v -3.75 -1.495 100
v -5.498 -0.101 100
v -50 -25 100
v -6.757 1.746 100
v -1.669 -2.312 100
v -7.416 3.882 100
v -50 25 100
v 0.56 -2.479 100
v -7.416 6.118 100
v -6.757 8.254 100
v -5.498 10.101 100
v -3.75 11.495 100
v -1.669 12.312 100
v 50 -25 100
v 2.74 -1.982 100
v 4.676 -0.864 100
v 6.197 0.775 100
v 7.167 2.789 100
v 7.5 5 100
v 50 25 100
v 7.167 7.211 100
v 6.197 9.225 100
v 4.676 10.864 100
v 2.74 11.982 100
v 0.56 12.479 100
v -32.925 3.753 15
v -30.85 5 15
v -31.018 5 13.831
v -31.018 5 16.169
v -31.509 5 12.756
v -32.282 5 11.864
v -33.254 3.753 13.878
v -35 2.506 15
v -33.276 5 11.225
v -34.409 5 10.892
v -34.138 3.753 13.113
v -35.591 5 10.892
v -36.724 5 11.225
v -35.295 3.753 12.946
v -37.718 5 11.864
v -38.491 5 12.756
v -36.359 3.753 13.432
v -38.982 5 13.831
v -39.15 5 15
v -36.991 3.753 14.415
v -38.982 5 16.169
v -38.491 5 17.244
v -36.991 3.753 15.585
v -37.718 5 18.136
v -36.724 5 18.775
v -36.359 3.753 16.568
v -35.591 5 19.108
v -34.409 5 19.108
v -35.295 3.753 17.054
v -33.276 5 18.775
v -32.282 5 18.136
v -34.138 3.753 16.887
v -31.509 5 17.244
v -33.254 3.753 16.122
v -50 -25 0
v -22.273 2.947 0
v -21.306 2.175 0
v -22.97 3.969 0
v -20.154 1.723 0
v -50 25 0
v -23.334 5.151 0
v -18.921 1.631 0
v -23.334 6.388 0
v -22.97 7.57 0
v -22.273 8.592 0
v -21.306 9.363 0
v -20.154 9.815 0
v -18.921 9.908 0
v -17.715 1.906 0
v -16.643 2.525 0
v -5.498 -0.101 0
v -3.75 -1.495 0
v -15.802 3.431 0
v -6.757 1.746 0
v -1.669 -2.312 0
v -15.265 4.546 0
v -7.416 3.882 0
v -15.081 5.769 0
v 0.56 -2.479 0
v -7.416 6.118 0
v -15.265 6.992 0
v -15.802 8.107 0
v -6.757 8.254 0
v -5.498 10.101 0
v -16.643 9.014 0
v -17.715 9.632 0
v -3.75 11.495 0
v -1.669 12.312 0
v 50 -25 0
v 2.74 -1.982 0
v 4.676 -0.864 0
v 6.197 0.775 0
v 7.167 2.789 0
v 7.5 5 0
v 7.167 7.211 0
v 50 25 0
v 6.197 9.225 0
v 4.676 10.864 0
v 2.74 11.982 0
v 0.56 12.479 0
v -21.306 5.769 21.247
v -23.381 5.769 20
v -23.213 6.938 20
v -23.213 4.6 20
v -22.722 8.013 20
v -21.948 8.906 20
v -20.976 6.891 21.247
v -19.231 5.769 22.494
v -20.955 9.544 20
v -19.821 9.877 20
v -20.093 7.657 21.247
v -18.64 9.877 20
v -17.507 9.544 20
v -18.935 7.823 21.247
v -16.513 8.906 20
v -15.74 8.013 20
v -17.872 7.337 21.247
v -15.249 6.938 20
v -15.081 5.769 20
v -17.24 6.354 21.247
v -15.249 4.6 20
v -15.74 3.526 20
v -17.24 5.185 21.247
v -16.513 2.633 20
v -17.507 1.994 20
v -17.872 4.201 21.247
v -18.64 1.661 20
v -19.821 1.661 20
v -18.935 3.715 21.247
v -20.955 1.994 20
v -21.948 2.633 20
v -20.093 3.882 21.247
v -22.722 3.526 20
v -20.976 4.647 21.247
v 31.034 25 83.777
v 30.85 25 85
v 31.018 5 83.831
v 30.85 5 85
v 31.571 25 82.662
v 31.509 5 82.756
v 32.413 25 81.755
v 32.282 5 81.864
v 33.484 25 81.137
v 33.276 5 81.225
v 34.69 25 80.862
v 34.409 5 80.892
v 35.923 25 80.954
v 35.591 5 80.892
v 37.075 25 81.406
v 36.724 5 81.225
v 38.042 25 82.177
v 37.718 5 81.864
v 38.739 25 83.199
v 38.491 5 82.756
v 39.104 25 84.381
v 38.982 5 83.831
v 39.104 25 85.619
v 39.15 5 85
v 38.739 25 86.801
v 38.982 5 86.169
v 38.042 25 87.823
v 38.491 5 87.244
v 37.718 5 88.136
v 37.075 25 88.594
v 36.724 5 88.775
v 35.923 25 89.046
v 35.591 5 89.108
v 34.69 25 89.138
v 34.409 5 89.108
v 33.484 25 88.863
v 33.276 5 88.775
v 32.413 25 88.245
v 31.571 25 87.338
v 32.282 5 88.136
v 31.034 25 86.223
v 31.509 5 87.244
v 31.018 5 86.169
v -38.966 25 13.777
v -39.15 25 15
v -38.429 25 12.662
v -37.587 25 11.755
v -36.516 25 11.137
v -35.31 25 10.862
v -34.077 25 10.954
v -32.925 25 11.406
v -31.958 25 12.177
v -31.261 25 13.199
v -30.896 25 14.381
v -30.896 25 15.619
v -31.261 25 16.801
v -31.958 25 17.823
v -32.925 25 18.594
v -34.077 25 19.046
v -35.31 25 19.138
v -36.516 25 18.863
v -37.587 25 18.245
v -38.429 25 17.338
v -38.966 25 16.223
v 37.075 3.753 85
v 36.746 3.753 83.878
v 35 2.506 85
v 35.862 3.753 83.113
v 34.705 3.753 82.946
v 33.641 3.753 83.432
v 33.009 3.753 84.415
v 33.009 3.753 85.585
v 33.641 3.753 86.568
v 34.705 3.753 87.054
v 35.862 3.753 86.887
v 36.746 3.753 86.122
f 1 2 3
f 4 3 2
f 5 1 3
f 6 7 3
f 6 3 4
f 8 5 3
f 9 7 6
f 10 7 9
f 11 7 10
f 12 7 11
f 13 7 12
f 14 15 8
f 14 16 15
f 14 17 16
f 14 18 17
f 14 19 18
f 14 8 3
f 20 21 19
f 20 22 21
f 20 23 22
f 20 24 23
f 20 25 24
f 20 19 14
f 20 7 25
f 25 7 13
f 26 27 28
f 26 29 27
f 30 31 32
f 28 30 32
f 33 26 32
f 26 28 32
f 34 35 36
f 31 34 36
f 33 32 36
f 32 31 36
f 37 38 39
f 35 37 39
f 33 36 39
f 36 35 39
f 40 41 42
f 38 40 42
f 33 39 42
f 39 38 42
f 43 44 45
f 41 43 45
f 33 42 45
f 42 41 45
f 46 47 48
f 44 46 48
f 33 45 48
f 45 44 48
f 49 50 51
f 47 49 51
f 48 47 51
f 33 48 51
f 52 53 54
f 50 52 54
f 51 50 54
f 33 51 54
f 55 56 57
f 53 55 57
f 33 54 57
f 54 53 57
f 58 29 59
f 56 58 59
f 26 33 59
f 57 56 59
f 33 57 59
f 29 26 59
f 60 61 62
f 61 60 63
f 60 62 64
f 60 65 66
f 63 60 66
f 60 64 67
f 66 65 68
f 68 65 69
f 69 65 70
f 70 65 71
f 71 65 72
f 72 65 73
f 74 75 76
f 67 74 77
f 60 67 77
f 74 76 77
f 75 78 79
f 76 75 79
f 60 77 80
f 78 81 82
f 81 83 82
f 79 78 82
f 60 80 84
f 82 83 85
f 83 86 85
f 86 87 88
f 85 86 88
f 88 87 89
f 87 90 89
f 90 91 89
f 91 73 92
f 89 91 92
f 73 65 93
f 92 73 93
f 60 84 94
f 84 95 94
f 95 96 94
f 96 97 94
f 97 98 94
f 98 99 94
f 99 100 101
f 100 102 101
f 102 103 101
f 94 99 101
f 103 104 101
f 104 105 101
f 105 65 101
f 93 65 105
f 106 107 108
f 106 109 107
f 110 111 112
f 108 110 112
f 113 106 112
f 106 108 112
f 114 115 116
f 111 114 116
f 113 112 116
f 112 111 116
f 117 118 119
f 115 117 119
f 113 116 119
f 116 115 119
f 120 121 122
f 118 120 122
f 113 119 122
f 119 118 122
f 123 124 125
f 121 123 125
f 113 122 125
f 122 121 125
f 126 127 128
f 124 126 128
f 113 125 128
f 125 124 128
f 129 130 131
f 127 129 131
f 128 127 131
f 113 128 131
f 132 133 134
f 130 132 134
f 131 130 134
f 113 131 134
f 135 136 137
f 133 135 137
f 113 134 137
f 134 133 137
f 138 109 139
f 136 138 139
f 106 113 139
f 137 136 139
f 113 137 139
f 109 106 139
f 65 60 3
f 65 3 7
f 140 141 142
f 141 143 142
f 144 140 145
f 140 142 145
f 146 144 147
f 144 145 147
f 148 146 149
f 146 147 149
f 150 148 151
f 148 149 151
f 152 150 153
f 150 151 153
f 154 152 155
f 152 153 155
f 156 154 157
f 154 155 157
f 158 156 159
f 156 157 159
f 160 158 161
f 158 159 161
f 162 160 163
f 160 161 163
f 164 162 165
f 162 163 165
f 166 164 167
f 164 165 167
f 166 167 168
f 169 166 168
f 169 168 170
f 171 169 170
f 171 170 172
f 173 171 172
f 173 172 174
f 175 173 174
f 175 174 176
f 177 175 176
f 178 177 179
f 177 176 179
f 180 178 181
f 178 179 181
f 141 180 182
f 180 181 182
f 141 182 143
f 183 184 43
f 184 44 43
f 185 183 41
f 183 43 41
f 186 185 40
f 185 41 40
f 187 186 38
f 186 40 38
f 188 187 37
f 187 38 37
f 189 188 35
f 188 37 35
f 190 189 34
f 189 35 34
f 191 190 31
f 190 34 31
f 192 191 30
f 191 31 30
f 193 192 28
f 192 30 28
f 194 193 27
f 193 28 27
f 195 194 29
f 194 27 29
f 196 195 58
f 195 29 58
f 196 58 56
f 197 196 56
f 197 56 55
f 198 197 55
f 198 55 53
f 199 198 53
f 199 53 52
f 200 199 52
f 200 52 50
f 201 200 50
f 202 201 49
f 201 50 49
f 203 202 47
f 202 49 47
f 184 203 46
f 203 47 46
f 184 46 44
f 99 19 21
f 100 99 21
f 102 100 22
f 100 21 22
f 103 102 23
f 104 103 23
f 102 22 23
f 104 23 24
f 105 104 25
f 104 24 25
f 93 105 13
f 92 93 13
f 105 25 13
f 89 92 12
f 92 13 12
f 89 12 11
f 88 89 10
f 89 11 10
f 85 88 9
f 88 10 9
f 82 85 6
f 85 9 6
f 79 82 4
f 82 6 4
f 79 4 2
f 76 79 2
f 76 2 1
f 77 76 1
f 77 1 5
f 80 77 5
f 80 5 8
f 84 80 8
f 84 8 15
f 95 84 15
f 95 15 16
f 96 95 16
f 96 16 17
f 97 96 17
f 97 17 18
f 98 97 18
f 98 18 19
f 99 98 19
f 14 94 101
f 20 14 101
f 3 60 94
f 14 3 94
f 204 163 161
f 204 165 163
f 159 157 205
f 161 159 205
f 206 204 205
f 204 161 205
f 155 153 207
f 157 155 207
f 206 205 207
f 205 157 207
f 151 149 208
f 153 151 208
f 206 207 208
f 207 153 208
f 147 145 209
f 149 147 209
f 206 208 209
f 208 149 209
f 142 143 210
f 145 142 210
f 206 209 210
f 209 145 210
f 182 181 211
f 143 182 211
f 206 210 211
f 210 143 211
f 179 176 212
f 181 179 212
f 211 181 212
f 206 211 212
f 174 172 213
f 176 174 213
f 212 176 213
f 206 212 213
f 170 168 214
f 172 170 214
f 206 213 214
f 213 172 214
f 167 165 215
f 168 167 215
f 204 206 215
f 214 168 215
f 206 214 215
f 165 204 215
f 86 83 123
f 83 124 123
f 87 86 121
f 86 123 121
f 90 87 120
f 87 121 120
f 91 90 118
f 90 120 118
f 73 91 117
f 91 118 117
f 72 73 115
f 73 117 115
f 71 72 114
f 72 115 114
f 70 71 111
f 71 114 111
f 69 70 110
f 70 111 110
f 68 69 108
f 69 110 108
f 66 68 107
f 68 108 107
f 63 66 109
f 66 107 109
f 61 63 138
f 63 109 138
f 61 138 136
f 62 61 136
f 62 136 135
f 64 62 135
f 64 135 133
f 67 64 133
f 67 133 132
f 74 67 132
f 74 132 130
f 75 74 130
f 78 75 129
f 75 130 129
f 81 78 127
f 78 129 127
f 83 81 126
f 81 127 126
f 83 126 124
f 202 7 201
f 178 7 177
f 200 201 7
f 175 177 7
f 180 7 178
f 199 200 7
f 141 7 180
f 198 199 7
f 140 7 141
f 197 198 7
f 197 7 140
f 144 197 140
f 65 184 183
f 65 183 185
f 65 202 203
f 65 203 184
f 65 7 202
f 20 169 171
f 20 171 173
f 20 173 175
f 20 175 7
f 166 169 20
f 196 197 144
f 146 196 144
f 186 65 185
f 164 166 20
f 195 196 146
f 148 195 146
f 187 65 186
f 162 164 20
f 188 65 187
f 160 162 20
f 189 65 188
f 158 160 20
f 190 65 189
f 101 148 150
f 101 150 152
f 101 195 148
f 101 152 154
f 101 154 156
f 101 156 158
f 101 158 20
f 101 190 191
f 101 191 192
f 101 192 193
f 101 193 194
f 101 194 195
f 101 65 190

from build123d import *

# Parameters (mm, degrees)
SKIZZE1_W                                           = 100
SKIZZE1_H                                           = 50
AUFSATZ_LINEAR_AUSTRAGEN1_DEPTH                     = 100
KERNLOCH_F_R_M8_HELICOIL1_D                         = 8.3
KERNLOCH_F_R_M8_HELICOIL1_DEPTH                     = 20
KERNLOCH_F_R_M8_HELICOIL1_TIP                       = 2.493571569
STIRNSENKUNG_F_R_M8_SENKSCHRAUBE_KOPF_B_D           = 9
STIRNSENKUNG_F_R_M8_SENKSCHRAUBE_KOPF_B_CBORE_D     = 15
STIRNSENKUNG_F_R_M8_SENKSCHRAUBE_KOPF_B_CBORE_DEPTH = 116
KERNLOCH_F_R_M8_HELICOIL2_D                         = 8.3
KERNLOCH_F_R_M8_HELICOIL2_DEPTH                     = 20
KERNLOCH_F_R_M8_HELICOIL2_TIP                       = 2.493571569


with BuildPart() as part:
    # Skizze1 → Aufsatz-Linear austragen1 (new body)
    with BuildSketch(Plane.XY):
        Rectangle(SKIZZE1_W, SKIZZE1_H)
    extrude(amount=AUFSATZ_LINEAR_AUSTRAGEN1_DEPTH)

    # Kernloch für M8 Helicoil1
    with Locations(Plane(origin=(0, 25, 0), x_dir=(1, 0, 0), z_dir=(0, 1, 0))):
        with Locations((35, -85), (-35, -15)):
            Hole(KERNLOCH_F_R_M8_HELICOIL1_D / 2, depth=KERNLOCH_F_R_M8_HELICOIL1_DEPTH)
            with Locations((0, 0, -(KERNLOCH_F_R_M8_HELICOIL1_DEPTH + KERNLOCH_F_R_M8_HELICOIL1_TIP / 2))):  # 118° drill point
                Cone(0, KERNLOCH_F_R_M8_HELICOIL1_D / 2, KERNLOCH_F_R_M8_HELICOIL1_TIP, mode=Mode.SUBTRACT)

    # Stirnsenkung für M8 Senkschraube (Kopf Button)1 (through all)
    with Locations(Plane.XY.offset(100)):
        with Locations((4.444e-06, 5)):
            CounterBoreHole(STIRNSENKUNG_F_R_M8_SENKSCHRAUBE_KOPF_B_D / 2, STIRNSENKUNG_F_R_M8_SENKSCHRAUBE_KOPF_B_CBORE_D / 2, STIRNSENKUNG_F_R_M8_SENKSCHRAUBE_KOPF_B_CBORE_DEPTH)

    # Kernloch für M8 Helicoil2
    with Locations(Plane(origin=(0, 0, 0), x_dir=(-1, 0, 0), z_dir=(0, 0, -1))):
        with Locations((19.230769231, 5.769226325)):
            Hole(KERNLOCH_F_R_M8_HELICOIL2_D / 2, depth=KERNLOCH_F_R_M8_HELICOIL2_DEPTH)
            with Locations((0, 0, -(KERNLOCH_F_R_M8_HELICOIL2_DEPTH + KERNLOCH_F_R_M8_HELICOIL2_TIP / 2))):  # 118° drill point
                Cone(0, KERNLOCH_F_R_M8_HELICOIL2_D / 2, KERNLOCH_F_R_M8_HELICOIL2_TIP, mode=Mode.SUBTRACT)


solid = part.part
